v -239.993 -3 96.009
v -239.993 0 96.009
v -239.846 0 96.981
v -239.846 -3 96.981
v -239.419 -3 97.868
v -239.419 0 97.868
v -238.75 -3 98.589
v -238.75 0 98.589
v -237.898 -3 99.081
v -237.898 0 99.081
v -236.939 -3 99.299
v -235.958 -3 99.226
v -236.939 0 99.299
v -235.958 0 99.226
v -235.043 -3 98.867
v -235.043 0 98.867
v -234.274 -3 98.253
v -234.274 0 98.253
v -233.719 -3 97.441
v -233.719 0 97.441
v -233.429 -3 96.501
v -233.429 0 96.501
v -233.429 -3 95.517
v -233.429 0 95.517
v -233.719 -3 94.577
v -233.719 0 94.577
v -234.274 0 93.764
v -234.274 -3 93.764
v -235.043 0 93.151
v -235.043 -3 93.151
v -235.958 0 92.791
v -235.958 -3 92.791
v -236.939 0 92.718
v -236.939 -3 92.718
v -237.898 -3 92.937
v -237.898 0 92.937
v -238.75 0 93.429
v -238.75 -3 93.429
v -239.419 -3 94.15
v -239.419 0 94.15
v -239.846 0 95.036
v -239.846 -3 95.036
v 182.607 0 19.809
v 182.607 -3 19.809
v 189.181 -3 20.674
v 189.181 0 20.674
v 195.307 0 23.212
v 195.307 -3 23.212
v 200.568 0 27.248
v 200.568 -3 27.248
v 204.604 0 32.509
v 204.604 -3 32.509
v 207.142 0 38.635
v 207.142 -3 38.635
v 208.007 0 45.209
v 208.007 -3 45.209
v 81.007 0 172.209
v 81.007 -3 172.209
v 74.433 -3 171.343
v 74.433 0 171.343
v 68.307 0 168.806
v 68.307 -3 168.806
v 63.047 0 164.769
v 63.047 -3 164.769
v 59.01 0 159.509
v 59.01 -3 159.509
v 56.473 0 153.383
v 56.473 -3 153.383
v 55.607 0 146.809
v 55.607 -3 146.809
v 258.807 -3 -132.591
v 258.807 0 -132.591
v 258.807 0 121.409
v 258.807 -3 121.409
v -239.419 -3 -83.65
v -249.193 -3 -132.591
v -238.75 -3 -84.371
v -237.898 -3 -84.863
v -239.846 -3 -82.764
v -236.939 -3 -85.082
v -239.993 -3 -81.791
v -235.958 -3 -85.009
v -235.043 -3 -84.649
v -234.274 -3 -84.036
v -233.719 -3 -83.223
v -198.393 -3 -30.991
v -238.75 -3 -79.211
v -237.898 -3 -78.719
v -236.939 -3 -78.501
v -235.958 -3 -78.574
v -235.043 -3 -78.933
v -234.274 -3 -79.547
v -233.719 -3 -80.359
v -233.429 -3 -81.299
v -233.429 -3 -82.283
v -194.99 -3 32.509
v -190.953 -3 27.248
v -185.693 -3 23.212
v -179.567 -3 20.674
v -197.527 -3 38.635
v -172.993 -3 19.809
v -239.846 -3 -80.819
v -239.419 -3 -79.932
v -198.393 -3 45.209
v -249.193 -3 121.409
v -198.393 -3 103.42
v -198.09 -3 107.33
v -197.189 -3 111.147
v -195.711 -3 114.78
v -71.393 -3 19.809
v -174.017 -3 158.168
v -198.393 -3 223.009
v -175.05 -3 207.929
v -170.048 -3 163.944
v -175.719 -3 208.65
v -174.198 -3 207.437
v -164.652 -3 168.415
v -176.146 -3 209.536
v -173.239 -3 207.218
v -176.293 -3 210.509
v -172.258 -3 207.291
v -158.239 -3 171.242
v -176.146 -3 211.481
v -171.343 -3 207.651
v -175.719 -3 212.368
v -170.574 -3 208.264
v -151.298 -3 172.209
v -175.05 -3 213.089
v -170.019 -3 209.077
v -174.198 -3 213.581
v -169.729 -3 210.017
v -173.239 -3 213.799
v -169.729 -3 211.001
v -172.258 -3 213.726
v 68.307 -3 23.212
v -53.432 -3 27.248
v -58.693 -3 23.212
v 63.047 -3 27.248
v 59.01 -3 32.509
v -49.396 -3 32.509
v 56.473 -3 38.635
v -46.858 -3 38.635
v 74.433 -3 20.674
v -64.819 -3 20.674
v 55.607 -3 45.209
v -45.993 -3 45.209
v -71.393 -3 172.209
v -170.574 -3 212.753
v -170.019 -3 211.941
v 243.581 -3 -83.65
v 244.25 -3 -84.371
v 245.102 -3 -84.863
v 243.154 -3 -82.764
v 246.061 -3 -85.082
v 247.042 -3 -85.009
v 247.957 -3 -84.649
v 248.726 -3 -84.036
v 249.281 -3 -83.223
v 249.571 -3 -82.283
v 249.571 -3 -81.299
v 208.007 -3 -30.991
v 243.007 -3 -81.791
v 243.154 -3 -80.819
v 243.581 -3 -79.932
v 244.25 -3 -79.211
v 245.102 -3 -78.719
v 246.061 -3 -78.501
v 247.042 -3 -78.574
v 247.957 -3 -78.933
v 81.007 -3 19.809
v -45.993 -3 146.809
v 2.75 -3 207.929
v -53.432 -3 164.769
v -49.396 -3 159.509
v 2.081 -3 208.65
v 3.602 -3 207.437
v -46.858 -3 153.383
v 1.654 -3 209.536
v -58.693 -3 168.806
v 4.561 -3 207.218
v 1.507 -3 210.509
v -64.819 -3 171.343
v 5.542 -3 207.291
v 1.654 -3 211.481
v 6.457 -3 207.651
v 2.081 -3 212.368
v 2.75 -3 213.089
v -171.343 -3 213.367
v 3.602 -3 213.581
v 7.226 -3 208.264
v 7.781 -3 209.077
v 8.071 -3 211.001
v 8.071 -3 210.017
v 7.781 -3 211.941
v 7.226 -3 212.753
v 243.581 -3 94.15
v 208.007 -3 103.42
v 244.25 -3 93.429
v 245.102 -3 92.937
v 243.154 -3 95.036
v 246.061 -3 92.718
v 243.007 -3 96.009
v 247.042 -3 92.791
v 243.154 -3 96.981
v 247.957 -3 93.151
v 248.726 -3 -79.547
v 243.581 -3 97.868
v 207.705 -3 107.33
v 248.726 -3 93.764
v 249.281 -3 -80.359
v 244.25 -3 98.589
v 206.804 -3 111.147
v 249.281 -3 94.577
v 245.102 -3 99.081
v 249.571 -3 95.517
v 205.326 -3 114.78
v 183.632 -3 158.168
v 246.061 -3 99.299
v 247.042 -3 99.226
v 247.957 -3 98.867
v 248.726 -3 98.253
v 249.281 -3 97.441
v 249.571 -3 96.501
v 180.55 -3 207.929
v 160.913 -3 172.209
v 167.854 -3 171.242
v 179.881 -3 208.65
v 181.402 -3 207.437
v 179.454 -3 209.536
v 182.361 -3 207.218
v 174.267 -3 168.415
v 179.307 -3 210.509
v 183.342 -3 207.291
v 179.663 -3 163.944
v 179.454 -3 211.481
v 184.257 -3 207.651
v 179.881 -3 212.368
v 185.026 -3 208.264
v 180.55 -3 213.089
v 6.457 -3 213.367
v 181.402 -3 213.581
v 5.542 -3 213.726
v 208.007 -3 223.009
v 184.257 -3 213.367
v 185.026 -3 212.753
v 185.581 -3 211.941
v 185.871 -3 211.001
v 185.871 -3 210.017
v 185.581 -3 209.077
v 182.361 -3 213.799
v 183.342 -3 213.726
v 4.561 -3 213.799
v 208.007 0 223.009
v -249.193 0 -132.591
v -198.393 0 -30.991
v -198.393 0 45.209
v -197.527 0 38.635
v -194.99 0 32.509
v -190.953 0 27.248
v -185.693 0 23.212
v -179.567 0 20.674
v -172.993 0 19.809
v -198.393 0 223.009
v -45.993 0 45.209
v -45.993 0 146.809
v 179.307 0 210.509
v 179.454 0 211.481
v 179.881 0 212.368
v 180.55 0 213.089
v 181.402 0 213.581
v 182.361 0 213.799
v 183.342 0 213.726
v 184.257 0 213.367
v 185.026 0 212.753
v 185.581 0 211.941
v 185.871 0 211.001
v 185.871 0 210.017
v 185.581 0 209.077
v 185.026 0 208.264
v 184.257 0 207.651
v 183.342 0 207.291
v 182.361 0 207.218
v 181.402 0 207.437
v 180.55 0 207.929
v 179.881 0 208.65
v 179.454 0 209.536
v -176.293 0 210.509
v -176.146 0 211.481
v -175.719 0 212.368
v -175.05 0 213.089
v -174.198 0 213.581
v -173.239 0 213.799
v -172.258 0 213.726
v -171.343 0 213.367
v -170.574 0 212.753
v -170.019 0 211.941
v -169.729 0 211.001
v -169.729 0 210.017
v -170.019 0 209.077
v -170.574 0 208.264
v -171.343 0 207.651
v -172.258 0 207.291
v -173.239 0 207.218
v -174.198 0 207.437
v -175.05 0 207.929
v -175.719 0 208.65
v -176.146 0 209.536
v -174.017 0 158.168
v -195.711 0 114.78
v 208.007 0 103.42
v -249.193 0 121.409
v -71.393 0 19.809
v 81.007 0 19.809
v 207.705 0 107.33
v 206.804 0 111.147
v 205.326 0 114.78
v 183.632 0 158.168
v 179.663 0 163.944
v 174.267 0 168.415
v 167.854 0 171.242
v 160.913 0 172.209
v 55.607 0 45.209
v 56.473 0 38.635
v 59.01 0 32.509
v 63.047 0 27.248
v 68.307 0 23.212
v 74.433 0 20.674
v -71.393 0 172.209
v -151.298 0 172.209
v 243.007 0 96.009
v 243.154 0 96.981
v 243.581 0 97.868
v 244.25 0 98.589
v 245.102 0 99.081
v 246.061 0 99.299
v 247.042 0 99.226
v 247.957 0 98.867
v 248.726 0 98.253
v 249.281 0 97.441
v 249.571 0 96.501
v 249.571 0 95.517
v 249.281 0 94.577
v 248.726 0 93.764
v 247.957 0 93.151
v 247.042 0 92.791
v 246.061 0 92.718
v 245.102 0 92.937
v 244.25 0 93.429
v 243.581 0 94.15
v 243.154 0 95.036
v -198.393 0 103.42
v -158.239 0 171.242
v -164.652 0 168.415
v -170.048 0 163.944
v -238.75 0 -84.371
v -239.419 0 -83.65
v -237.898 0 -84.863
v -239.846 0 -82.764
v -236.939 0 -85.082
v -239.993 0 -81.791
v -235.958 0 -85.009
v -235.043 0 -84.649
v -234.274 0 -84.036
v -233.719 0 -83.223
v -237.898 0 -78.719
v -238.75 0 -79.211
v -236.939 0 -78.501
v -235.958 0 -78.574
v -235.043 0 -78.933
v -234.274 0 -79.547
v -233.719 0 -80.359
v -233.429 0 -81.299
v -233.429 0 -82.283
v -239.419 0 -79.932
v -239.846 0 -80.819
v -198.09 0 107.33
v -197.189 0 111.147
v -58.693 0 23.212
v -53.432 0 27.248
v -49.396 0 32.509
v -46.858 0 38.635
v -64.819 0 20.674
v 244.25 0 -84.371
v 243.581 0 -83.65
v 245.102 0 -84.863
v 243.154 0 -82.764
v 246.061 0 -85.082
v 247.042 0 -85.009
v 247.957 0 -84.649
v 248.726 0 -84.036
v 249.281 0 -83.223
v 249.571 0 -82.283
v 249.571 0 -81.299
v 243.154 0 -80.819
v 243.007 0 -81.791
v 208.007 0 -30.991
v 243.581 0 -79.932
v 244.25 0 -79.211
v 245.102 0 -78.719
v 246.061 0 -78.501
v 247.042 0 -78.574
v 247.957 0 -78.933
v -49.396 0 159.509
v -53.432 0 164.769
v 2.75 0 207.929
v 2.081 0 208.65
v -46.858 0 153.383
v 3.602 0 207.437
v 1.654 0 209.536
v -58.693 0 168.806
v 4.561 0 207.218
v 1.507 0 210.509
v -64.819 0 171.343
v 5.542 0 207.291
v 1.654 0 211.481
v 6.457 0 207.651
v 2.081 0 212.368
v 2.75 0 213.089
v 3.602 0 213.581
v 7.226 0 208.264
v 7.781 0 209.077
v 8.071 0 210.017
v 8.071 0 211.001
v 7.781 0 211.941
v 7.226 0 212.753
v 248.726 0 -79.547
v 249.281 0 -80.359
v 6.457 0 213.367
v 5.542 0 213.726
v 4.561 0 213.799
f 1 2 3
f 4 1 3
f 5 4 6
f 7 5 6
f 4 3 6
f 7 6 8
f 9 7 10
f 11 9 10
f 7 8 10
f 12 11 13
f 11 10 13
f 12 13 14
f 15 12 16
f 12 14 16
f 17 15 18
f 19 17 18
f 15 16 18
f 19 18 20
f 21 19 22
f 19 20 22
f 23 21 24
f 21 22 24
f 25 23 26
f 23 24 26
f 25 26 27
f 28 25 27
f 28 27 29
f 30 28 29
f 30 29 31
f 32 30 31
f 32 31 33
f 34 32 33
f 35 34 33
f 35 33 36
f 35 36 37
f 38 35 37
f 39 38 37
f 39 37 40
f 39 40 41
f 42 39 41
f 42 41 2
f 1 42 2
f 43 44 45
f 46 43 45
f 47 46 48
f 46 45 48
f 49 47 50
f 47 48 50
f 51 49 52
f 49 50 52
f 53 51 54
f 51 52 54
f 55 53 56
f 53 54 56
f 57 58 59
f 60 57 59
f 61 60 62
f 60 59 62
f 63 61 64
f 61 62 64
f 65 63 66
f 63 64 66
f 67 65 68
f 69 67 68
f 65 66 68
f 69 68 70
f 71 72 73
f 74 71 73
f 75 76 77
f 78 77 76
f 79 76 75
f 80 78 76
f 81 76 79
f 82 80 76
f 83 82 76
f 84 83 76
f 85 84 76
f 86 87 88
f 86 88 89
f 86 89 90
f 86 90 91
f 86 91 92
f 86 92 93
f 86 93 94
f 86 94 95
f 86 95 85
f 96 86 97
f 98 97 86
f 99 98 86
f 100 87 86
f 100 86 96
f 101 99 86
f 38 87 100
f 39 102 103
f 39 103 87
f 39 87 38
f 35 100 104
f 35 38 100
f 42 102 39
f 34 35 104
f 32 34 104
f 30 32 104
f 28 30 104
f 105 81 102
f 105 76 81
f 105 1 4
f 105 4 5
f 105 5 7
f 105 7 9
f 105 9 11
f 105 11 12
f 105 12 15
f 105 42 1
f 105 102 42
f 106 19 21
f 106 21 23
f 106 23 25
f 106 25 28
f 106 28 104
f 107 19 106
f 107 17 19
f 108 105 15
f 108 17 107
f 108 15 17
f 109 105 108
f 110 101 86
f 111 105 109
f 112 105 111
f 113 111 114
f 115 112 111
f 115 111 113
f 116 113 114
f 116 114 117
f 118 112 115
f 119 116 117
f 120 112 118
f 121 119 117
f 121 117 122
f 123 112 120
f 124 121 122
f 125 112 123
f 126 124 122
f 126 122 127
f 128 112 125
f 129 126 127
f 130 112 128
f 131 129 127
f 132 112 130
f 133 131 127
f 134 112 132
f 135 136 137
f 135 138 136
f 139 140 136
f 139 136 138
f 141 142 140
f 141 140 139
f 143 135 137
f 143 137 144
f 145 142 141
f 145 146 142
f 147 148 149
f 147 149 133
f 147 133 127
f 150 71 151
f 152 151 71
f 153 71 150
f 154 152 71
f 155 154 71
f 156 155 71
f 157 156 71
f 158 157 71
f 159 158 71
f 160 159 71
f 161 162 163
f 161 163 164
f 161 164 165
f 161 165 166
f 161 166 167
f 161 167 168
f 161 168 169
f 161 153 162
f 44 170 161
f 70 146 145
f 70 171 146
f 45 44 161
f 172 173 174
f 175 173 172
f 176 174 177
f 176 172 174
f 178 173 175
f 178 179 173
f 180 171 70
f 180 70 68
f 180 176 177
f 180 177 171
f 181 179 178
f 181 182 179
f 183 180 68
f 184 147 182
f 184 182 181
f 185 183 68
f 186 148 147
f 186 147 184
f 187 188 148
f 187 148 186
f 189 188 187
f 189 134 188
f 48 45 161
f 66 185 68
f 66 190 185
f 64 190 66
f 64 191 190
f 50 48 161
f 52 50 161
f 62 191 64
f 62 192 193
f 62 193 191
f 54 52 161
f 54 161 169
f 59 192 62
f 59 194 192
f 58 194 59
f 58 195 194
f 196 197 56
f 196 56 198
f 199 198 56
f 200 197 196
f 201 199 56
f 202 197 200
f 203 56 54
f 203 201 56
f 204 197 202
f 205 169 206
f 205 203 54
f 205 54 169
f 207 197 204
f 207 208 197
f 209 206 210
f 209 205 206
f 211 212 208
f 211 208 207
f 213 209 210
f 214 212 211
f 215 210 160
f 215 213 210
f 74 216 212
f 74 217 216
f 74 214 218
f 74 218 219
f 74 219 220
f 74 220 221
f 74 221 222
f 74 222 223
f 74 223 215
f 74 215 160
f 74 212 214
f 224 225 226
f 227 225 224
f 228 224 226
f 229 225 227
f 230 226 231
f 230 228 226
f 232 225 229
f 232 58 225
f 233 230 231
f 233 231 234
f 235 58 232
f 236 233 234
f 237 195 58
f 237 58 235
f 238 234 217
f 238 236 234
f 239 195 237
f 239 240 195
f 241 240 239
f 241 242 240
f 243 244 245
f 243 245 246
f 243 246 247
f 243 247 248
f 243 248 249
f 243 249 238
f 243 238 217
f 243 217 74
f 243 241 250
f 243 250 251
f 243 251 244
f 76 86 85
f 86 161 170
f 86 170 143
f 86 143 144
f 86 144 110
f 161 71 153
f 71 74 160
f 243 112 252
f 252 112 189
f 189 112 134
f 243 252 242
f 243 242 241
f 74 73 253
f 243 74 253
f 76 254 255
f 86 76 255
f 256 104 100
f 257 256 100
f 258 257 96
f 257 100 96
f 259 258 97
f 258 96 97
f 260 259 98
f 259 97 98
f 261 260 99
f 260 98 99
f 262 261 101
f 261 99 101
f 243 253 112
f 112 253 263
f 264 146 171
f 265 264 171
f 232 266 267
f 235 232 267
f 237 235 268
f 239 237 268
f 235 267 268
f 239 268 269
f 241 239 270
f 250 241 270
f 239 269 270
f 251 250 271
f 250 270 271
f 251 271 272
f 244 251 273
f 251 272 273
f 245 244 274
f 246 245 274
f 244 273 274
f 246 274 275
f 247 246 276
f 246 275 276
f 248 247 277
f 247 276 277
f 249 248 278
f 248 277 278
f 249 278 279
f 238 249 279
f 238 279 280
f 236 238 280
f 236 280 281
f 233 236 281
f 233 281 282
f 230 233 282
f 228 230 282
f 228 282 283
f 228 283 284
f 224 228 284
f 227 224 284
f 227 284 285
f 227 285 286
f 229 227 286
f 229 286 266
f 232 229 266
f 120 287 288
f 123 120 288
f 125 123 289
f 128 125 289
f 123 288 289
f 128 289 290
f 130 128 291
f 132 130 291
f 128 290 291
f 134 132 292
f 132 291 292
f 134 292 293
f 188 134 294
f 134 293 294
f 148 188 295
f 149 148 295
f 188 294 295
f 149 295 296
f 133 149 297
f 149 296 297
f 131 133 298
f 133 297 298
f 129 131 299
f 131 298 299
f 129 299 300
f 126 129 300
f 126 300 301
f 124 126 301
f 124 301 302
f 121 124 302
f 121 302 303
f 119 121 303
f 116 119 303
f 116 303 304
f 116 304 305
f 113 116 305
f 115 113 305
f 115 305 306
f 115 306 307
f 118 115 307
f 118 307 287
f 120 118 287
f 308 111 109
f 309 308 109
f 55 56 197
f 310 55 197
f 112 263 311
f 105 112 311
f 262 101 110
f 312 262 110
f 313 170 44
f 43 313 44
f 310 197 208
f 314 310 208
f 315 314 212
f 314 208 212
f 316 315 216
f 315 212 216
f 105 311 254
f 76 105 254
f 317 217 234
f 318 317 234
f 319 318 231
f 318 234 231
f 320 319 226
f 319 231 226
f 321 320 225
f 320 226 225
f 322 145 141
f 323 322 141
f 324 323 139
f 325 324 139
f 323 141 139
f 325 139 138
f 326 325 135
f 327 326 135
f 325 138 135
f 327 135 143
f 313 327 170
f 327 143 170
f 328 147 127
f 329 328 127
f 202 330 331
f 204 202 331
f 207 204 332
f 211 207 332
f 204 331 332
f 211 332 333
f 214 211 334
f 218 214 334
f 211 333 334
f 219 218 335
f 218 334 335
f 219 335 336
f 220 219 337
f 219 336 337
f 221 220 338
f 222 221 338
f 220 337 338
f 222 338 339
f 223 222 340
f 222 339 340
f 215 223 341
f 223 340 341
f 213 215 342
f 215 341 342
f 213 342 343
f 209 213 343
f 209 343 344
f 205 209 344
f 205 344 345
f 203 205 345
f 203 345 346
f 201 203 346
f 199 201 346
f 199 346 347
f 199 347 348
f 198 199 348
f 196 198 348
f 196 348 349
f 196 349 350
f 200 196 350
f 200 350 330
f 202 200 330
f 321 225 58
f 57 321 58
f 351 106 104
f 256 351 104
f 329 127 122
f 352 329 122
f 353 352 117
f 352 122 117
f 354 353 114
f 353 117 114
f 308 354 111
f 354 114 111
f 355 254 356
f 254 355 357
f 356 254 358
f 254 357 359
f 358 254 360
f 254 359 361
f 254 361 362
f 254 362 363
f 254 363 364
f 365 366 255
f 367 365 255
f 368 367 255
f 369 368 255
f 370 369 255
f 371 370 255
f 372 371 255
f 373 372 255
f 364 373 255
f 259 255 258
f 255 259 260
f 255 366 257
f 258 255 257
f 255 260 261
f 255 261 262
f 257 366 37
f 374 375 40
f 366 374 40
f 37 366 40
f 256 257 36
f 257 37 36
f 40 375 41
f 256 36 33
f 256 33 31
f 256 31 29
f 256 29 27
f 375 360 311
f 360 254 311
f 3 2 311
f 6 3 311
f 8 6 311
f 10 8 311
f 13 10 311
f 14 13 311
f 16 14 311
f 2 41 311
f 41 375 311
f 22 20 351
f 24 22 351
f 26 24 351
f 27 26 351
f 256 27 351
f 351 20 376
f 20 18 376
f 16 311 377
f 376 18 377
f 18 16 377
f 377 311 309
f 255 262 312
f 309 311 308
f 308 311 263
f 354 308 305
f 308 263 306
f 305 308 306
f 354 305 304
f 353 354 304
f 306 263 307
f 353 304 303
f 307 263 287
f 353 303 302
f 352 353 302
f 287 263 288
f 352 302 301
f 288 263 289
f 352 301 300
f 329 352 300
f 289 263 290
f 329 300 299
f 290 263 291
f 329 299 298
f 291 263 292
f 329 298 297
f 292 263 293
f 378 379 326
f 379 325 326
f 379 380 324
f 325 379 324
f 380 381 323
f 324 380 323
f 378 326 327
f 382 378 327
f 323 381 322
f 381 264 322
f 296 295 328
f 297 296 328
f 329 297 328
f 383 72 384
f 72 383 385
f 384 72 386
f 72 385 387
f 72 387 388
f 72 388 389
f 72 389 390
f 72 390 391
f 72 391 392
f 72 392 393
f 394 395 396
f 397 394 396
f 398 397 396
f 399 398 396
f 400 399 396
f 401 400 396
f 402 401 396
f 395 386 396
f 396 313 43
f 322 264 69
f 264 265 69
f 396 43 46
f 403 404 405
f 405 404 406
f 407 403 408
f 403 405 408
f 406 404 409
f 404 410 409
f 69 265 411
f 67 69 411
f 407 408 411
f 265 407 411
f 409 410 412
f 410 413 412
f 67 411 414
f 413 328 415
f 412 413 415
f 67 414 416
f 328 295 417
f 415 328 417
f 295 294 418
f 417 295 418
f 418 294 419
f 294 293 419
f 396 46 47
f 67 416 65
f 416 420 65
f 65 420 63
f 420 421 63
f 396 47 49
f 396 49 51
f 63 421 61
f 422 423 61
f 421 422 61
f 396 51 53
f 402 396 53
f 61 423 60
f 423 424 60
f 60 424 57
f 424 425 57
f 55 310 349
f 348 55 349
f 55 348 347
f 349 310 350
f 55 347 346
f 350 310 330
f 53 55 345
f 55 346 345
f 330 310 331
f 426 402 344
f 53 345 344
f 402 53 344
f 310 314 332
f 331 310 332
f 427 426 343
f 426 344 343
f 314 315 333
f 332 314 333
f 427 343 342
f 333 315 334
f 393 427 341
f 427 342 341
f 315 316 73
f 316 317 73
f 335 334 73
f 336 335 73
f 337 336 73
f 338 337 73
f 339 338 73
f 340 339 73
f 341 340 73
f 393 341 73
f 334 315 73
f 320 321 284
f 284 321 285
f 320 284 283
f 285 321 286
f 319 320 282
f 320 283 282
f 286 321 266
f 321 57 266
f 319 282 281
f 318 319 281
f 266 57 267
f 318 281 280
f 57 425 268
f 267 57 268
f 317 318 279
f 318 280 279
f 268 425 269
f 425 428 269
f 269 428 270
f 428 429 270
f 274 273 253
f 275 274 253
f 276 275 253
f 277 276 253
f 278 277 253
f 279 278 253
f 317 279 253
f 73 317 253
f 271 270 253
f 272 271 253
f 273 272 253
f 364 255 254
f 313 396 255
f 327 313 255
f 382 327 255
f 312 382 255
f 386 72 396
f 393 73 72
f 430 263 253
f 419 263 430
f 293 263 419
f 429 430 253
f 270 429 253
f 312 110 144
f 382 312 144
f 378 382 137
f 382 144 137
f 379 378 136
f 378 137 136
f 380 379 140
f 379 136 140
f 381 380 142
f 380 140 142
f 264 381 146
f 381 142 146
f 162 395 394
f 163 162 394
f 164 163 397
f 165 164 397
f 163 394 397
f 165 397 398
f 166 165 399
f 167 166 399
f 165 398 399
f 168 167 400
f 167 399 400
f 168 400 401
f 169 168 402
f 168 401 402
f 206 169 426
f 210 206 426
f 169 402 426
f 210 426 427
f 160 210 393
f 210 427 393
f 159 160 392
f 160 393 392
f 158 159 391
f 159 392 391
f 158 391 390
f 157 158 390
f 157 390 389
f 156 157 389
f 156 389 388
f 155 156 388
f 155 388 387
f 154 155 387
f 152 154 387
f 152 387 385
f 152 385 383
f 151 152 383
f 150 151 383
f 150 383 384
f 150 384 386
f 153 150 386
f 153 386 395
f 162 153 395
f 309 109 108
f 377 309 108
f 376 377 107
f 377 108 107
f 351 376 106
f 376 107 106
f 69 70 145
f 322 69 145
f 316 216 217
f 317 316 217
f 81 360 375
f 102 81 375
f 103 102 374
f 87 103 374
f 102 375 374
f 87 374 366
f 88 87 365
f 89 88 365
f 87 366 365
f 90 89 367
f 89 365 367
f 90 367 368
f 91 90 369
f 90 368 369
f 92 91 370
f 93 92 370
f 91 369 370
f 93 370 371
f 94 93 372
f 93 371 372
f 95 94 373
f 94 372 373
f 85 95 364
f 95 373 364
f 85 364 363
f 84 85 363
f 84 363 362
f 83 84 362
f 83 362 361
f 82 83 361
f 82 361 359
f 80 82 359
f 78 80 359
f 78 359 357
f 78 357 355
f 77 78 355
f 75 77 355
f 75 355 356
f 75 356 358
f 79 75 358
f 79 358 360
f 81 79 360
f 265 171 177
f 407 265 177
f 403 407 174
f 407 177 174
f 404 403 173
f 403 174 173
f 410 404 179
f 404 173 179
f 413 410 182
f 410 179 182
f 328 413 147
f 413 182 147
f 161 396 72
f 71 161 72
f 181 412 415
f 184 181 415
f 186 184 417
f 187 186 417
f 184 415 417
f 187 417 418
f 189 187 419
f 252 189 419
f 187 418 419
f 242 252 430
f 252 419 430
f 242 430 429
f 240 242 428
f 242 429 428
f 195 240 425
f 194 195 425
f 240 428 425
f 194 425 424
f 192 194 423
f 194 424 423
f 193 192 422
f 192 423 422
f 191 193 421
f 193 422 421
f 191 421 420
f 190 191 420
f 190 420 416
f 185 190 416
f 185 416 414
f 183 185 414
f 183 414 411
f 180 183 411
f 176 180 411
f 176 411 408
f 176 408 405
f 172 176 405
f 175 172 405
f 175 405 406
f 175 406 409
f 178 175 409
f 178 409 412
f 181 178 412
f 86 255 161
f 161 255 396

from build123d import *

# Parameters (mm, degrees)
F1_DEPTH = 3
F3_DEPTH = 3.001
F5_D     = 6.6


with BuildPart() as f1:
    # F0 (on Front) → F1 (new body)
    with BuildSketch(Plane.XZ):
        Polygon((-249.1925892383, 121.4087251365), (-249.1925892383, -132.5912748635), (-198.3925892383, -30.9912748635), (208.0074107617, -30.9912748635), (258.8074107617, -132.5912748635), (258.8074107617, 121.4087251365), (208.0074107617, 223.0087251365), (-198.3925892383, 223.0087251365), align=None)
    extrude(amount=F1_DEPTH)

    # F2 (on face) → F3 (cut, through all)
    with BuildSketch(Plane.XZ.offset(3)):
        with BuildLine():
            ThreePointArc((-198.3925892383, 45.2087251365), (-190.9531014804, 27.2482128944), (-172.9925892383, 19.8087251365))
            Line((-172.9925892383, 19.8087251365), (-71.3925892383, 19.8087251365))
            ThreePointArc((-71.3925892383, 19.8087251365), (-53.4320769961, 27.2482128944), (-45.9925892383, 45.2087251365))
            Line((-45.9925892383, 45.2087251365), (-45.9925892383, 146.8087251365))
            ThreePointArc((-45.9925892383, 146.8087251365), (-53.4320769961, 164.7692373787), (-71.3925892383, 172.2087251365))
            Line((-71.3925892383, 172.2087251365), (-151.2983992955, 172.2087251365))
            ThreePointArc((-151.2983992955, 172.2087251365), (-164.6519695434, 168.4152556687), (-174.0168499469, 158.1679504622))
            Line((-174.0168499469, 158.1679504622), (-195.7110398897, 114.7795705767))
            ThreePointArc((-195.7110398897, 114.7795705767), (-197.7131135708, 109.2560694329), (-198.3925892383, 103.420345251))
            Line((-198.3925892383, 103.420345251), (-198.3925892383, 45.2087251365))
        make_face()
        with BuildLine():
            ThreePointArc((208.0074107617, 103.420345251), (207.3279350942, 109.2560694329), (205.3258614131, 114.7795705767))
            Line((205.3258614131, 114.7795705767), (183.6316714704, 158.1679504622))
            ThreePointArc((183.6316714704, 158.1679504622), (174.2667910668, 168.4152556687), (160.913220819, 172.2087251365))
            Line((160.913220819, 172.2087251365), (81.0074107617, 172.2087251365))
            ThreePointArc((81.0074107617, 172.2087251365), (63.0468985196, 164.7692373787), (55.6074107617, 146.8087251365))
            Line((55.6074107617, 146.8087251365), (55.6074107617, 45.2087251365))
            ThreePointArc((55.6074107617, 45.2087251365), (63.0468985196, 27.2482128944), (81.0074107617, 19.8087251365))
            Line((81.0074107617, 19.8087251365), (182.6074107617, 19.8087251365))
            ThreePointArc((182.6074107617, 19.8087251365), (200.5679230039, 27.2482128944), (208.0074107617, 45.2087251365))
            Line((208.0074107617, 45.2087251365), (208.0074107617, 103.420345251))
        make_face()
    extrude(amount=-F3_DEPTH, mode=Mode.SUBTRACT)

    # F5 (through all)
    with Locations(Plane.XZ.offset(3)):
        with Locations((-172.9925892383, 210.5087251365), (4.8074107617, 210.5087251365), (182.6074107617, 210.5087251365), (246.3074107617, 96.0087251365), (246.3074107617, -81.7912748635), (-236.6925892383, -81.7912748635), (-236.6925892383, 96.0087251365)):
            Hole(F5_D / 2)


solid = f1.part
